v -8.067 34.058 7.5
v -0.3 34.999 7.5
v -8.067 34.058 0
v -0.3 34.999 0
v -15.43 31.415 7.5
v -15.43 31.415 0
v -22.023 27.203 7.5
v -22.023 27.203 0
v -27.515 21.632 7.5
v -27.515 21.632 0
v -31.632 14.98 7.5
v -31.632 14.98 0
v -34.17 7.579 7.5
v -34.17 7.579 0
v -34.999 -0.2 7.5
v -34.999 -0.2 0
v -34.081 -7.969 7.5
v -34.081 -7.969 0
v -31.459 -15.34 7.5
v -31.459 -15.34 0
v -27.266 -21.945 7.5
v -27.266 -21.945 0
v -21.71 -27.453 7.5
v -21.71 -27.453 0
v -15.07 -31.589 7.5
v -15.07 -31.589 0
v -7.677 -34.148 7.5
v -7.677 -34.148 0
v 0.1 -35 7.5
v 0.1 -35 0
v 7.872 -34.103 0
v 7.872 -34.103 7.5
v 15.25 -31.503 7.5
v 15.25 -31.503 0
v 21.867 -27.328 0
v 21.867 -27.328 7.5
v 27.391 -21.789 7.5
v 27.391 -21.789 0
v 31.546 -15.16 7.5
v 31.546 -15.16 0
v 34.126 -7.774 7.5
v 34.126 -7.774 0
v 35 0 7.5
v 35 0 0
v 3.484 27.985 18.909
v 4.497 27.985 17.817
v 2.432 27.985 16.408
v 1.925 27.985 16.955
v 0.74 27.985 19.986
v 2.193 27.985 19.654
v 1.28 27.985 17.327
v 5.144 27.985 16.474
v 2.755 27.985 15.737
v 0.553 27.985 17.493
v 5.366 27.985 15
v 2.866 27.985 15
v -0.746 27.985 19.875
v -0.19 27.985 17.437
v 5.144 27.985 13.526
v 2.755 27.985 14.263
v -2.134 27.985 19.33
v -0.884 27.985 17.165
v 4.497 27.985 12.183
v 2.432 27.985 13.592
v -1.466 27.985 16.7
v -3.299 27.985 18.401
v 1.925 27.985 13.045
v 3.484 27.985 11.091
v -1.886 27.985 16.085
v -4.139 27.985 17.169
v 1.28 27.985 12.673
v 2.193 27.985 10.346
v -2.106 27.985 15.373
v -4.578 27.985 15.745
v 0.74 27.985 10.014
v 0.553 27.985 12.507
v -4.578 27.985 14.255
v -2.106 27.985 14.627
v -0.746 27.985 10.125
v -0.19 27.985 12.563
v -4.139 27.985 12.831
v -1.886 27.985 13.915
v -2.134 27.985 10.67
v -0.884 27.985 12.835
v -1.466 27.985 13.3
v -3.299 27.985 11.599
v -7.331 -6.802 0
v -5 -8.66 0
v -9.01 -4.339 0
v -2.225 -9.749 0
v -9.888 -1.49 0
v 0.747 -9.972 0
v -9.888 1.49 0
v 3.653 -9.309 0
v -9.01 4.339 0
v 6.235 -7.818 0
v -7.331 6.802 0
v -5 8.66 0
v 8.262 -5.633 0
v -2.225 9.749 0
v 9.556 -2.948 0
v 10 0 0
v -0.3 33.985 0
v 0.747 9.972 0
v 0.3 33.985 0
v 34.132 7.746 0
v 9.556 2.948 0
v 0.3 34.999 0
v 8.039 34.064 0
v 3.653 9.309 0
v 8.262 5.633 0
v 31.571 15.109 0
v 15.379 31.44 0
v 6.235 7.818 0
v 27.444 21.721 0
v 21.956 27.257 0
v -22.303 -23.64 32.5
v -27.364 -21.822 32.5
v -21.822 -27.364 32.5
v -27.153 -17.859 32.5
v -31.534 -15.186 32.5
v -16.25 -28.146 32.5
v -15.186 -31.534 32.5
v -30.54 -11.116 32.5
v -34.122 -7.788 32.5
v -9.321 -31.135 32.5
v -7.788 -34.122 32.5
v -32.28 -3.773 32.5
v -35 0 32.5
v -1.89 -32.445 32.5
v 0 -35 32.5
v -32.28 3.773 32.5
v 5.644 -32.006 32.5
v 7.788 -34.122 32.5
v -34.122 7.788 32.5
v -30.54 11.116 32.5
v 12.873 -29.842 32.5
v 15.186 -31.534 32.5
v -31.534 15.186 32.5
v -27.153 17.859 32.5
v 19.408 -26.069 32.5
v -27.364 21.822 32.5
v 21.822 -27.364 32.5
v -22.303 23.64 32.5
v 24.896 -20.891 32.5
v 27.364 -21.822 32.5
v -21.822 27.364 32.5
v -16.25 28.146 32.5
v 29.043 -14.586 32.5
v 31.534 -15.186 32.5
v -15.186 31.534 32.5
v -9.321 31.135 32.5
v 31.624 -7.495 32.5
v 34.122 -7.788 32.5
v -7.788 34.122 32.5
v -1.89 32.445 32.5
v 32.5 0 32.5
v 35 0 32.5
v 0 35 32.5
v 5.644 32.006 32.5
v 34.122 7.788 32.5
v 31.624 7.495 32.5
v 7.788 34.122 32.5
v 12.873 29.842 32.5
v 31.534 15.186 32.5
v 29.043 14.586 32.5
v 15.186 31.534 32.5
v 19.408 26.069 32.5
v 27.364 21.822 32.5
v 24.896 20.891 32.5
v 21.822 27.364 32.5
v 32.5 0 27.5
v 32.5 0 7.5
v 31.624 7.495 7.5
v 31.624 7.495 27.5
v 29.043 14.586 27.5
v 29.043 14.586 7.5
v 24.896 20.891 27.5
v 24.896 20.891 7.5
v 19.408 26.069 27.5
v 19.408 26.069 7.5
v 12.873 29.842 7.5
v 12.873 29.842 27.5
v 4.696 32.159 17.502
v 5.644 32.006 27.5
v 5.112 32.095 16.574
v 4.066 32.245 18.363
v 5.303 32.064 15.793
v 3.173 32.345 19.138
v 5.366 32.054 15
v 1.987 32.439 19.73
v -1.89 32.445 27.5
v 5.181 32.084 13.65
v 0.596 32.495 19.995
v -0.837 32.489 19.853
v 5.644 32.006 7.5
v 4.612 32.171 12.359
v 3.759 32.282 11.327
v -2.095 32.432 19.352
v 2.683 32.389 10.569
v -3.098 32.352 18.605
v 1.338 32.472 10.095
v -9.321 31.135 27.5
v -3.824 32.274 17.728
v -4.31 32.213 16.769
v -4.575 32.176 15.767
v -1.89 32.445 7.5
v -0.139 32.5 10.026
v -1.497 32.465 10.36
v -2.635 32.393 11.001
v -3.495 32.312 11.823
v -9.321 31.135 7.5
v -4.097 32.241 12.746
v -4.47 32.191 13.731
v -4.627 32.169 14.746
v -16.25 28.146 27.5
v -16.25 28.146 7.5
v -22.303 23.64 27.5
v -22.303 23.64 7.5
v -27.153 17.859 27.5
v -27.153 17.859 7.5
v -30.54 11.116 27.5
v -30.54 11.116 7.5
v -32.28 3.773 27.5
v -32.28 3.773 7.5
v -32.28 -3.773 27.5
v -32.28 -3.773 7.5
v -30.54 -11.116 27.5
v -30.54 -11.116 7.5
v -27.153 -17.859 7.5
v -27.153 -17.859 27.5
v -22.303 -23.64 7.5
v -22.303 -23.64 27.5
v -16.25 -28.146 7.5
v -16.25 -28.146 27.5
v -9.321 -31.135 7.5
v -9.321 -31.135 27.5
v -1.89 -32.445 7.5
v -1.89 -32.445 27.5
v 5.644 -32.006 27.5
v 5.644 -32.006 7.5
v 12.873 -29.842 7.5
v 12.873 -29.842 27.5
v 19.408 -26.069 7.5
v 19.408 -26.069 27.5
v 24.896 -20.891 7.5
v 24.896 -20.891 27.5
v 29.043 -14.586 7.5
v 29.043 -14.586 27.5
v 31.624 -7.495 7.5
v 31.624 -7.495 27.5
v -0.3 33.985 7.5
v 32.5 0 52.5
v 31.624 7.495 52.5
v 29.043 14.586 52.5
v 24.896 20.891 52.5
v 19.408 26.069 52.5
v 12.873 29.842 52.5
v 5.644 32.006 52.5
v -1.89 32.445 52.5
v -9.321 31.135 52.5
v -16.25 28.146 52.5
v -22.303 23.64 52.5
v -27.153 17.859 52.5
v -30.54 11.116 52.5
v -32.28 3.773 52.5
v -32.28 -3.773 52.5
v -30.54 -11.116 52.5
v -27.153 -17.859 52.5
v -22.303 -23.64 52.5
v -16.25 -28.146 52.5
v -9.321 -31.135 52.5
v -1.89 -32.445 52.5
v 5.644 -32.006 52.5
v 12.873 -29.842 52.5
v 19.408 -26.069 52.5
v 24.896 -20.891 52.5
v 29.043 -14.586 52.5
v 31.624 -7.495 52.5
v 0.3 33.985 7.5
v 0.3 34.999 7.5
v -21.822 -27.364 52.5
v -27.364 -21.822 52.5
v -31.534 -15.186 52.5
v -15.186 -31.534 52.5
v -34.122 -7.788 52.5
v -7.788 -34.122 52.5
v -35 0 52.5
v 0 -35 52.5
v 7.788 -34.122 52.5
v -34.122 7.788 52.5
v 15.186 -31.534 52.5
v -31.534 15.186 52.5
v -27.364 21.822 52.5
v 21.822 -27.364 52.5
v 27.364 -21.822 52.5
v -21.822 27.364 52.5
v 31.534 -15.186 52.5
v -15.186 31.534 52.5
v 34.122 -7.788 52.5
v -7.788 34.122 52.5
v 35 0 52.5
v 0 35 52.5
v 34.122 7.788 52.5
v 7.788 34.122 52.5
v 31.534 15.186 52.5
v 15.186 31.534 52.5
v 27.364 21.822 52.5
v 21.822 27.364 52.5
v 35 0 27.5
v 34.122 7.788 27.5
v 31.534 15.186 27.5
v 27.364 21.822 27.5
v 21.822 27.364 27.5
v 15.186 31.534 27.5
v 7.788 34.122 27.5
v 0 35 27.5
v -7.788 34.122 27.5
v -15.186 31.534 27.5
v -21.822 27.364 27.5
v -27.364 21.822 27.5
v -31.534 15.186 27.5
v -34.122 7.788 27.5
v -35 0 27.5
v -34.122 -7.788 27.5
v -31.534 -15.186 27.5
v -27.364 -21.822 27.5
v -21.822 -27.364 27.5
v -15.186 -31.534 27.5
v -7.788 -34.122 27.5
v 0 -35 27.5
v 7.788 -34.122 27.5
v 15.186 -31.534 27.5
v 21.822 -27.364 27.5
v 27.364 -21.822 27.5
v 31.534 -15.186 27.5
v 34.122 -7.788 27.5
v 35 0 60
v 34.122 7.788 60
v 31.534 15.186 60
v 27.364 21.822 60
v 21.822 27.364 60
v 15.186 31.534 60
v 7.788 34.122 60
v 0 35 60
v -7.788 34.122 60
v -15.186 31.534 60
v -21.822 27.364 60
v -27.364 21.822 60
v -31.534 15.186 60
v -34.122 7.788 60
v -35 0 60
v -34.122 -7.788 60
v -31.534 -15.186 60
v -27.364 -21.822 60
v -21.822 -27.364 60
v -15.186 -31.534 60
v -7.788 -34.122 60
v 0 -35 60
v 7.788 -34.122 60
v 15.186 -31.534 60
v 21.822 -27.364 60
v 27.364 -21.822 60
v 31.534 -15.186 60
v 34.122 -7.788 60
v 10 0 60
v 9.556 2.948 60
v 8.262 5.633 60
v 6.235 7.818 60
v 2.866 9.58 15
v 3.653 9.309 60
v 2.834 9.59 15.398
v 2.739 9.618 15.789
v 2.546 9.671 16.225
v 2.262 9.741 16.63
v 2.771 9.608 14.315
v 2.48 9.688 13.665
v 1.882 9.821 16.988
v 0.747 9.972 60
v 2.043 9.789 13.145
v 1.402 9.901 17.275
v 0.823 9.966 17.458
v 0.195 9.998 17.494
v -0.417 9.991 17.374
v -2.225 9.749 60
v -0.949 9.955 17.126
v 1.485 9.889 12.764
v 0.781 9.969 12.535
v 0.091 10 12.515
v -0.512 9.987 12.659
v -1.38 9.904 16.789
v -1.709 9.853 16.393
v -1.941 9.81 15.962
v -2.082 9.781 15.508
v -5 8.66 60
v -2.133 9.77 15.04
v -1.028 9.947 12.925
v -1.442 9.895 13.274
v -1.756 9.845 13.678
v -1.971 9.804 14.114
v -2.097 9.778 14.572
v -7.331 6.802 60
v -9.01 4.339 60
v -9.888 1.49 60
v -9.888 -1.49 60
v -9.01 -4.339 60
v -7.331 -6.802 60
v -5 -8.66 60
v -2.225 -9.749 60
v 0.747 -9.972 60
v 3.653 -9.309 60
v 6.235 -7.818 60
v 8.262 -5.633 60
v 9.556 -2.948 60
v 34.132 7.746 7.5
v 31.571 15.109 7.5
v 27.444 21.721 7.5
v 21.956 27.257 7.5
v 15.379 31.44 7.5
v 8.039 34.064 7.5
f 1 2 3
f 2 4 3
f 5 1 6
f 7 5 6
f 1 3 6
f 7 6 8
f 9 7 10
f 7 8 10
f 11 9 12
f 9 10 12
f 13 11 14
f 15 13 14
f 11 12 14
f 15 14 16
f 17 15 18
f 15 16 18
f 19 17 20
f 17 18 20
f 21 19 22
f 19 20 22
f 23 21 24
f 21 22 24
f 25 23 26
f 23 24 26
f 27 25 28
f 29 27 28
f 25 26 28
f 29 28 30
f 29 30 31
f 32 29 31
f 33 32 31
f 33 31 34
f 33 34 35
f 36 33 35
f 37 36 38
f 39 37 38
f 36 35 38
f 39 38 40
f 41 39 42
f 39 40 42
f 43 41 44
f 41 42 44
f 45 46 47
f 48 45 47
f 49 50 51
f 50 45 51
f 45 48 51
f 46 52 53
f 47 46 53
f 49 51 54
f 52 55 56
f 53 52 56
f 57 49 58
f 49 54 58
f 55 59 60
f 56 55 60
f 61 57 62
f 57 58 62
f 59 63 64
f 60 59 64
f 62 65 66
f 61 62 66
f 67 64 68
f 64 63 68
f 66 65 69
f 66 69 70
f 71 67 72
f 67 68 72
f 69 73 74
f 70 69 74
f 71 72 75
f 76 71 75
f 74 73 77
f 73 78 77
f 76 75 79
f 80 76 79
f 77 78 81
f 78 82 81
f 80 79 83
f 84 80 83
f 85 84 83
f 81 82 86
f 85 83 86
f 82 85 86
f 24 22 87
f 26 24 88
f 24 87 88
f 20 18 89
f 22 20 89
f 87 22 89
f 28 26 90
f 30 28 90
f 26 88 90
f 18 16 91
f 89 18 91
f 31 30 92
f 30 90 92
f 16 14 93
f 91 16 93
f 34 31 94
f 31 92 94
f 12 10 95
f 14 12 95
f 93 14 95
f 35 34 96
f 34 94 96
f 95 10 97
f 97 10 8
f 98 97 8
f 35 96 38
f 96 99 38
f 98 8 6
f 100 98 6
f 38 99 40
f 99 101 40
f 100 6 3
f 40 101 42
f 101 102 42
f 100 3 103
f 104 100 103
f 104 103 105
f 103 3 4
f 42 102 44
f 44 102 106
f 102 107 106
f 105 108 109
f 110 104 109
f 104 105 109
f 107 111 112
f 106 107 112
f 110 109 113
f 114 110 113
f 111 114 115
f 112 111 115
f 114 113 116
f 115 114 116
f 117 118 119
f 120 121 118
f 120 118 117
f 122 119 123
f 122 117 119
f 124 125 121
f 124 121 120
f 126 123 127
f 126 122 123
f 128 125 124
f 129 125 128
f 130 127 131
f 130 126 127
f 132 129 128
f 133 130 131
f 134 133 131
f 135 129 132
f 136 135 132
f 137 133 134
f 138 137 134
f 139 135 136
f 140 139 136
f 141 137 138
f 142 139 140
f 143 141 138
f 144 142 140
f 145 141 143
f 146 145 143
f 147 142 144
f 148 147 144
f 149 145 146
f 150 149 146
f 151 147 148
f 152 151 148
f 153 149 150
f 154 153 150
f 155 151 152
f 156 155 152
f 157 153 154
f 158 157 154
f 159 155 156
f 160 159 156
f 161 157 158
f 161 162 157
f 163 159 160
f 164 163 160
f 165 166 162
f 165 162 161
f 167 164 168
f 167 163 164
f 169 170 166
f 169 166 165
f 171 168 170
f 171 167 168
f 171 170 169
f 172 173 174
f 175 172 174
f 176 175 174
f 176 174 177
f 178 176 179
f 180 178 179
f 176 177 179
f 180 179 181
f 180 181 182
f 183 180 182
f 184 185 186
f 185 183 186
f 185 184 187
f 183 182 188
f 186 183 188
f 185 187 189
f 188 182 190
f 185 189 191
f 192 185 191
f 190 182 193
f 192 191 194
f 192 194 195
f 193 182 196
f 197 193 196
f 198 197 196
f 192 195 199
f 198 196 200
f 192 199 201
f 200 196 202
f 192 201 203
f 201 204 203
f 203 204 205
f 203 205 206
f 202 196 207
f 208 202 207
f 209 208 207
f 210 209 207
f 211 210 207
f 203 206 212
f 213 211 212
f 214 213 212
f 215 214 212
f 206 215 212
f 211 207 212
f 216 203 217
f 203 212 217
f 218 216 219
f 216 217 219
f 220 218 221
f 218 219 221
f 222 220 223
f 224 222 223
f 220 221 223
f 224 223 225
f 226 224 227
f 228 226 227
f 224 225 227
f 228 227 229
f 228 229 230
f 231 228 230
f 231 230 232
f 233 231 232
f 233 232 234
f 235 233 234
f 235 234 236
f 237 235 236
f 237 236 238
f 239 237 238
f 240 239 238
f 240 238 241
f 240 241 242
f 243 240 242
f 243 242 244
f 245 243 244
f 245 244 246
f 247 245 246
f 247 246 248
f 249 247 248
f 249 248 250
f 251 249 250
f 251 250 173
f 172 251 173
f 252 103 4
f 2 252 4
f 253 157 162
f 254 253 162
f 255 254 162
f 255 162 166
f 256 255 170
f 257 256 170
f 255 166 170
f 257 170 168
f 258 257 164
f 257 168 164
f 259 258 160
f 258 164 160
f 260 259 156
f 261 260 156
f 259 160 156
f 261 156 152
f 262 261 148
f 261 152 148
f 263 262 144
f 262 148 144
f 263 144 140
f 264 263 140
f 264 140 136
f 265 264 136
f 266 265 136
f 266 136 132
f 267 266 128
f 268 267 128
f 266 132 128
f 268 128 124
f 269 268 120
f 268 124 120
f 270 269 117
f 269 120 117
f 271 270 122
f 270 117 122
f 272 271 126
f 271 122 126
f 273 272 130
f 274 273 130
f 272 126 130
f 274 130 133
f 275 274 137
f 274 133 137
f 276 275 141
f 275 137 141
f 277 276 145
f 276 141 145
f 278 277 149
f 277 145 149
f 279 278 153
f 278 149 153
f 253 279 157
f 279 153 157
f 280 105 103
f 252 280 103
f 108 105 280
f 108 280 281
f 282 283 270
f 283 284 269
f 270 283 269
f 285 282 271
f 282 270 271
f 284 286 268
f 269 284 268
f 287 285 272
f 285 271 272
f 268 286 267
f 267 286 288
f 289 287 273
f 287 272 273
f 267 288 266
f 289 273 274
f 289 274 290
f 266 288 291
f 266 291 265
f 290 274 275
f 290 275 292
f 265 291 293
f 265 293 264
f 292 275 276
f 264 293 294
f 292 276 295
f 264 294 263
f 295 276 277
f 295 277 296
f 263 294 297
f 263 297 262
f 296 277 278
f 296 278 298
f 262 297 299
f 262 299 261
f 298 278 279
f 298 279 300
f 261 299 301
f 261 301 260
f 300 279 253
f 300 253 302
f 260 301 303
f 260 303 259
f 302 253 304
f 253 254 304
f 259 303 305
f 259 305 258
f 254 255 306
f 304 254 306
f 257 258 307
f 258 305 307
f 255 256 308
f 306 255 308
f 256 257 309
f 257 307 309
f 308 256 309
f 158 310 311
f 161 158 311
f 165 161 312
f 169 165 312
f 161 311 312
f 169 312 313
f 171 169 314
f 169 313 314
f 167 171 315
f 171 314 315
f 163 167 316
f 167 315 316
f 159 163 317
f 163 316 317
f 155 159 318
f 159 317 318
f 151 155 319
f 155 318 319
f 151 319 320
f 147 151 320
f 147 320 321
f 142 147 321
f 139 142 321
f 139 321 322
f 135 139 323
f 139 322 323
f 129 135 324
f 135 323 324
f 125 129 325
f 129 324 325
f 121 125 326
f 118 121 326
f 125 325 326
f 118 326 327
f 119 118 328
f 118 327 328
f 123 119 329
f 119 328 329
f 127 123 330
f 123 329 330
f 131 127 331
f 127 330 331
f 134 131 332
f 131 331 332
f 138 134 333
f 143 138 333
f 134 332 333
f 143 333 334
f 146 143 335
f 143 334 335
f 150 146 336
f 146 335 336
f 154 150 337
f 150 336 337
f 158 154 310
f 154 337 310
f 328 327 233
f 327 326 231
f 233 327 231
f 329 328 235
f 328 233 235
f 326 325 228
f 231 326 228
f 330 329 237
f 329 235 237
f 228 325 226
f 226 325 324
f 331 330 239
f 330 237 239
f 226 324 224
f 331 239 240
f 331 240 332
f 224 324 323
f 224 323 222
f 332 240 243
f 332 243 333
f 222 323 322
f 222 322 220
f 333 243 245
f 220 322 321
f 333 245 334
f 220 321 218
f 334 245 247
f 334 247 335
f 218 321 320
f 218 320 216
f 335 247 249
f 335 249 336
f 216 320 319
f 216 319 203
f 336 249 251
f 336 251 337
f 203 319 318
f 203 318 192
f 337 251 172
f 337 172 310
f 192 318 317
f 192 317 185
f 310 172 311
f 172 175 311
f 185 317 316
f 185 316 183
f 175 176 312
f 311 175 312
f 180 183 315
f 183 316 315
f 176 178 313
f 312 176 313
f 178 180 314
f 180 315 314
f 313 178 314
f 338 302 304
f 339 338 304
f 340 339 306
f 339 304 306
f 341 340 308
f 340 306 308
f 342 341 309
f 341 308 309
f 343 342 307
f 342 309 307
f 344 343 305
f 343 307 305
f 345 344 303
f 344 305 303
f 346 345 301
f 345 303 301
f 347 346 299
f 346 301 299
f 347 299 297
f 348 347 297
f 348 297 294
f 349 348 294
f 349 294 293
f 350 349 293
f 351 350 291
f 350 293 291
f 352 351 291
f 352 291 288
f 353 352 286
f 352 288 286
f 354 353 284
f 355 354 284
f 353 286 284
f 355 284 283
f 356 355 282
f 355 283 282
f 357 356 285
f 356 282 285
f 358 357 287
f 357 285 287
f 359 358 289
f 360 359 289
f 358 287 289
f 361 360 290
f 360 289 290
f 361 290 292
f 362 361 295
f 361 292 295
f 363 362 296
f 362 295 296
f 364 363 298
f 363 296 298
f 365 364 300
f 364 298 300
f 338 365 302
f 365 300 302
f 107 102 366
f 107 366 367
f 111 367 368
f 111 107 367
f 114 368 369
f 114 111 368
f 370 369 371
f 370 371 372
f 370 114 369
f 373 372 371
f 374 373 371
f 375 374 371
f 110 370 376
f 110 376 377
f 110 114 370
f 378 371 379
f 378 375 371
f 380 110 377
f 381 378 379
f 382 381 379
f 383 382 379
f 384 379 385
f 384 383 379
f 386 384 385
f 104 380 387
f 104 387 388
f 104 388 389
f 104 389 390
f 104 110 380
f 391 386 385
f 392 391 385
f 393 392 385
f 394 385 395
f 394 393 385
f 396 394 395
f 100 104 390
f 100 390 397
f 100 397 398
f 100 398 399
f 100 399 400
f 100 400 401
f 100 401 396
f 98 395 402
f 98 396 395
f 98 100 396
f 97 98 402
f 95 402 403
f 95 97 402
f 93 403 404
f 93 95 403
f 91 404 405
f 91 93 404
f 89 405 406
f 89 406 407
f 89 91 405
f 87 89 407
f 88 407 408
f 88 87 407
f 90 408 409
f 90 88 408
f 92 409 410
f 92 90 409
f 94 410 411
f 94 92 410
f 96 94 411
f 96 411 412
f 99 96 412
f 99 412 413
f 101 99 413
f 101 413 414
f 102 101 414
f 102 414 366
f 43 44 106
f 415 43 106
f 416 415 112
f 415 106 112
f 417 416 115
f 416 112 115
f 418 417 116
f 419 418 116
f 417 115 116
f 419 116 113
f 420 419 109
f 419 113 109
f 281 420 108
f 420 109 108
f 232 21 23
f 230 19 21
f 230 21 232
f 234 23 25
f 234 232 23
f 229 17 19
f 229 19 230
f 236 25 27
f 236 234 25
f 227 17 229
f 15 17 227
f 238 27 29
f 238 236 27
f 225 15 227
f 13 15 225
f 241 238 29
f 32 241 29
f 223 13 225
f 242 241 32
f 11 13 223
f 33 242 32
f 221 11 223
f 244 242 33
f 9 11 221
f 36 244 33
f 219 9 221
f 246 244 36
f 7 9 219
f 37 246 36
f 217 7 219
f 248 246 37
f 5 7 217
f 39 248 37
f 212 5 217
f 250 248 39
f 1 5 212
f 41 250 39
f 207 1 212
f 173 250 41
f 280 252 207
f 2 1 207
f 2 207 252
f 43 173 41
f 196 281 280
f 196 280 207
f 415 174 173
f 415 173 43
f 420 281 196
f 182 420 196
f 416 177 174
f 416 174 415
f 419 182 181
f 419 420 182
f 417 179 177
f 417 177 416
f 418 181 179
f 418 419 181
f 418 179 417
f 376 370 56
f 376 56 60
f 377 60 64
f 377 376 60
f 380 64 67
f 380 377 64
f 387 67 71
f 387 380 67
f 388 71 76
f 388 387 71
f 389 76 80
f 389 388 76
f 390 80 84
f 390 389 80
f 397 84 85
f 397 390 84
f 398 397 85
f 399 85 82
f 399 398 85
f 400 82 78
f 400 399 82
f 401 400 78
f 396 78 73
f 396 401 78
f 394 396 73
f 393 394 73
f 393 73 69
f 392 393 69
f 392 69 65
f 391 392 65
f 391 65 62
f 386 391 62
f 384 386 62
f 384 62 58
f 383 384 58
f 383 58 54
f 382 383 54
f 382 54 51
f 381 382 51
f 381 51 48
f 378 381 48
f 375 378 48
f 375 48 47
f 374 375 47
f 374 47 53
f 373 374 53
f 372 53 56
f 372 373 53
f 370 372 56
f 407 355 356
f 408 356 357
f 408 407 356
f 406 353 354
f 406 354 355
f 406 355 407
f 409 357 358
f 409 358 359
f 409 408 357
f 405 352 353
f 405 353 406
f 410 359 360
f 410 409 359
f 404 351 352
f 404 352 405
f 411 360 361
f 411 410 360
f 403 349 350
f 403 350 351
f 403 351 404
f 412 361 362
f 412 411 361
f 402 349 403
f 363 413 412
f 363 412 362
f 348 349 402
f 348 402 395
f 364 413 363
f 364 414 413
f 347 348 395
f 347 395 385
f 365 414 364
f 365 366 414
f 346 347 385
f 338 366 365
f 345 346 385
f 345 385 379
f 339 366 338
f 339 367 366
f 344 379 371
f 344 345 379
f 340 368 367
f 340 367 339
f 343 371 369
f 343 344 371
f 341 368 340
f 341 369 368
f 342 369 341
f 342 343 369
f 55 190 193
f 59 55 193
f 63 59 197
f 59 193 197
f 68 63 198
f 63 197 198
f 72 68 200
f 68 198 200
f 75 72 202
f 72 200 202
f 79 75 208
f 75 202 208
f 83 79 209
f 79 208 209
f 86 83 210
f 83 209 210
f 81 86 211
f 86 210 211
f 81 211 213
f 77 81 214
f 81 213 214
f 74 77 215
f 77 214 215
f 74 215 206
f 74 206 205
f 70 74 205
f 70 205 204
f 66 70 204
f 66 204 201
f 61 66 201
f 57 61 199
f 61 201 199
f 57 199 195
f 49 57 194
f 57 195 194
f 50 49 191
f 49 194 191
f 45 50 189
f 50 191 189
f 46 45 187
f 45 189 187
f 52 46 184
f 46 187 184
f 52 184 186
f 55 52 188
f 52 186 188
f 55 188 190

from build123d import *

# Parameters (mm, degrees)
ESQUISSE1_R                 = 35
ESQUISSE1_R_2               = 10
BOSS_EXTRU_1_DEPTH          = 7.5
ESQUISSE2_R                 = 32.5
ESQUISSE2_R_2               = 10
BOSS_EXTRU_2_DEPTH          = 20
ESQUISSE3_R                 = 35
ESQUISSE3_R_2               = 10
BOSS_EXTRU_3_DEPTH          = 5
ESQUISSE4_R                 = 32.5
ESQUISSE4_R_2               = 10
BOSS_EXTRU_4_DEPTH          = 20
ESQUISSE5_R                 = 35
ESQUISSE5_R_2               = 10
BOSS_EXTRU_5_DEPTH          = 7.5
ESQUISSE7_W                 = 0.6
ESQUISSE7_H                 = 2.216048933
ENL_V_MAT_EXTRU_3_DEPTH     = 7.5
ENL_V_MAT_EXTRU_6_OUTLINE_W = 5
ENL_V_MAT_EXTRU_6_OUTLINE_H = 4.514677359
ENL_V_START                 = 9.580417676
ENL_V_MAT_EXTRU_7_OUTLINE_R = 2.5
ENL_V_MAT_EXTRU_7_DEPTH     = 18.40495848


# Read off the part's stored shape, not the designer's step: Enlèv. mat.-Extru.6, Enlèv. mat.-Extru.7
with BuildPart() as part:
    # Esquisse1 → Boss.-Extru.1 (new body)
    with BuildSketch(Plane.XY):
        Circle(ESQUISSE1_R)
        Circle(ESQUISSE1_R_2, mode=Mode.SUBTRACT)
    extrude(amount=BOSS_EXTRU_1_DEPTH)

    # Esquisse2 → Boss.-Extru.2 (add)
    with BuildSketch(Plane.XY.offset(7.5)):
        Circle(ESQUISSE2_R)
        Circle(ESQUISSE2_R_2, mode=Mode.SUBTRACT)
    extrude(amount=BOSS_EXTRU_2_DEPTH)

    # Esquisse3 → Boss.-Extru.3 (add)
    with BuildSketch(Plane.XY.offset(27.5)):
        Circle(ESQUISSE3_R)
        Circle(ESQUISSE3_R_2, mode=Mode.SUBTRACT)
    extrude(amount=BOSS_EXTRU_3_DEPTH)

    # Esquisse4 → Boss.-Extru.4 (add)
    with BuildSketch(Plane.XY.offset(32.5)):
        Circle(ESQUISSE4_R)
        Circle(ESQUISSE4_R_2, mode=Mode.SUBTRACT)
    extrude(amount=BOSS_EXTRU_4_DEPTH)

    # Esquisse5 → Boss.-Extru.5 (add)
    with BuildSketch(Plane.XY.offset(52.5)):
        Circle(ESQUISSE5_R)
        Circle(ESQUISSE5_R_2, mode=Mode.SUBTRACT)
    extrude(amount=BOSS_EXTRU_5_DEPTH)

    # Esquisse7 → Enlèv. mat.-Extru.3 (cut)
    with BuildSketch(Plane(origin=(0, 0, 0), x_dir=(-1, 0, 0), z_dir=(0, 0, -1))):
        with Locations((0, 35.093400622)):
            Rectangle(ESQUISSE7_W, ESQUISSE7_H)
    extrude(amount=-ENL_V_MAT_EXTRU_3_DEPTH, mode=Mode.SUBTRACT)

    # Enlèv. mat.-Extru.6 outline → Enlèv. mat.-Extru.6 (revolve, cut)
    with BuildSketch(Plane(origin=(0.366285961, 0, 15), x_dir=(1, 0, 0), z_dir=(0, 0, 1))):
        with Locations((2.5, 30.242714836)):
            Rectangle(ENL_V_MAT_EXTRU_6_OUTLINE_W, ENL_V_MAT_EXTRU_6_OUTLINE_H)
    revolve(axis=Axis((0.366285961, 0, 15), (0, 1, 0)), mode=Mode.SUBTRACT)

    # Enlèv. mat.-Extru.7 outline → Enlèv. mat.-Extru.7 (cut)
    with BuildSketch(Plane(origin=(0, 0, 0), x_dir=(1, 0, 0), z_dir=(0, 1, 0)).offset(ENL_V_START)):
        with Locations((0.366285961, -15)):
            Circle(ENL_V_MAT_EXTRU_7_OUTLINE_R)
    extrude(amount=ENL_V_MAT_EXTRU_7_DEPTH, mode=Mode.SUBTRACT)


solid = part.part
